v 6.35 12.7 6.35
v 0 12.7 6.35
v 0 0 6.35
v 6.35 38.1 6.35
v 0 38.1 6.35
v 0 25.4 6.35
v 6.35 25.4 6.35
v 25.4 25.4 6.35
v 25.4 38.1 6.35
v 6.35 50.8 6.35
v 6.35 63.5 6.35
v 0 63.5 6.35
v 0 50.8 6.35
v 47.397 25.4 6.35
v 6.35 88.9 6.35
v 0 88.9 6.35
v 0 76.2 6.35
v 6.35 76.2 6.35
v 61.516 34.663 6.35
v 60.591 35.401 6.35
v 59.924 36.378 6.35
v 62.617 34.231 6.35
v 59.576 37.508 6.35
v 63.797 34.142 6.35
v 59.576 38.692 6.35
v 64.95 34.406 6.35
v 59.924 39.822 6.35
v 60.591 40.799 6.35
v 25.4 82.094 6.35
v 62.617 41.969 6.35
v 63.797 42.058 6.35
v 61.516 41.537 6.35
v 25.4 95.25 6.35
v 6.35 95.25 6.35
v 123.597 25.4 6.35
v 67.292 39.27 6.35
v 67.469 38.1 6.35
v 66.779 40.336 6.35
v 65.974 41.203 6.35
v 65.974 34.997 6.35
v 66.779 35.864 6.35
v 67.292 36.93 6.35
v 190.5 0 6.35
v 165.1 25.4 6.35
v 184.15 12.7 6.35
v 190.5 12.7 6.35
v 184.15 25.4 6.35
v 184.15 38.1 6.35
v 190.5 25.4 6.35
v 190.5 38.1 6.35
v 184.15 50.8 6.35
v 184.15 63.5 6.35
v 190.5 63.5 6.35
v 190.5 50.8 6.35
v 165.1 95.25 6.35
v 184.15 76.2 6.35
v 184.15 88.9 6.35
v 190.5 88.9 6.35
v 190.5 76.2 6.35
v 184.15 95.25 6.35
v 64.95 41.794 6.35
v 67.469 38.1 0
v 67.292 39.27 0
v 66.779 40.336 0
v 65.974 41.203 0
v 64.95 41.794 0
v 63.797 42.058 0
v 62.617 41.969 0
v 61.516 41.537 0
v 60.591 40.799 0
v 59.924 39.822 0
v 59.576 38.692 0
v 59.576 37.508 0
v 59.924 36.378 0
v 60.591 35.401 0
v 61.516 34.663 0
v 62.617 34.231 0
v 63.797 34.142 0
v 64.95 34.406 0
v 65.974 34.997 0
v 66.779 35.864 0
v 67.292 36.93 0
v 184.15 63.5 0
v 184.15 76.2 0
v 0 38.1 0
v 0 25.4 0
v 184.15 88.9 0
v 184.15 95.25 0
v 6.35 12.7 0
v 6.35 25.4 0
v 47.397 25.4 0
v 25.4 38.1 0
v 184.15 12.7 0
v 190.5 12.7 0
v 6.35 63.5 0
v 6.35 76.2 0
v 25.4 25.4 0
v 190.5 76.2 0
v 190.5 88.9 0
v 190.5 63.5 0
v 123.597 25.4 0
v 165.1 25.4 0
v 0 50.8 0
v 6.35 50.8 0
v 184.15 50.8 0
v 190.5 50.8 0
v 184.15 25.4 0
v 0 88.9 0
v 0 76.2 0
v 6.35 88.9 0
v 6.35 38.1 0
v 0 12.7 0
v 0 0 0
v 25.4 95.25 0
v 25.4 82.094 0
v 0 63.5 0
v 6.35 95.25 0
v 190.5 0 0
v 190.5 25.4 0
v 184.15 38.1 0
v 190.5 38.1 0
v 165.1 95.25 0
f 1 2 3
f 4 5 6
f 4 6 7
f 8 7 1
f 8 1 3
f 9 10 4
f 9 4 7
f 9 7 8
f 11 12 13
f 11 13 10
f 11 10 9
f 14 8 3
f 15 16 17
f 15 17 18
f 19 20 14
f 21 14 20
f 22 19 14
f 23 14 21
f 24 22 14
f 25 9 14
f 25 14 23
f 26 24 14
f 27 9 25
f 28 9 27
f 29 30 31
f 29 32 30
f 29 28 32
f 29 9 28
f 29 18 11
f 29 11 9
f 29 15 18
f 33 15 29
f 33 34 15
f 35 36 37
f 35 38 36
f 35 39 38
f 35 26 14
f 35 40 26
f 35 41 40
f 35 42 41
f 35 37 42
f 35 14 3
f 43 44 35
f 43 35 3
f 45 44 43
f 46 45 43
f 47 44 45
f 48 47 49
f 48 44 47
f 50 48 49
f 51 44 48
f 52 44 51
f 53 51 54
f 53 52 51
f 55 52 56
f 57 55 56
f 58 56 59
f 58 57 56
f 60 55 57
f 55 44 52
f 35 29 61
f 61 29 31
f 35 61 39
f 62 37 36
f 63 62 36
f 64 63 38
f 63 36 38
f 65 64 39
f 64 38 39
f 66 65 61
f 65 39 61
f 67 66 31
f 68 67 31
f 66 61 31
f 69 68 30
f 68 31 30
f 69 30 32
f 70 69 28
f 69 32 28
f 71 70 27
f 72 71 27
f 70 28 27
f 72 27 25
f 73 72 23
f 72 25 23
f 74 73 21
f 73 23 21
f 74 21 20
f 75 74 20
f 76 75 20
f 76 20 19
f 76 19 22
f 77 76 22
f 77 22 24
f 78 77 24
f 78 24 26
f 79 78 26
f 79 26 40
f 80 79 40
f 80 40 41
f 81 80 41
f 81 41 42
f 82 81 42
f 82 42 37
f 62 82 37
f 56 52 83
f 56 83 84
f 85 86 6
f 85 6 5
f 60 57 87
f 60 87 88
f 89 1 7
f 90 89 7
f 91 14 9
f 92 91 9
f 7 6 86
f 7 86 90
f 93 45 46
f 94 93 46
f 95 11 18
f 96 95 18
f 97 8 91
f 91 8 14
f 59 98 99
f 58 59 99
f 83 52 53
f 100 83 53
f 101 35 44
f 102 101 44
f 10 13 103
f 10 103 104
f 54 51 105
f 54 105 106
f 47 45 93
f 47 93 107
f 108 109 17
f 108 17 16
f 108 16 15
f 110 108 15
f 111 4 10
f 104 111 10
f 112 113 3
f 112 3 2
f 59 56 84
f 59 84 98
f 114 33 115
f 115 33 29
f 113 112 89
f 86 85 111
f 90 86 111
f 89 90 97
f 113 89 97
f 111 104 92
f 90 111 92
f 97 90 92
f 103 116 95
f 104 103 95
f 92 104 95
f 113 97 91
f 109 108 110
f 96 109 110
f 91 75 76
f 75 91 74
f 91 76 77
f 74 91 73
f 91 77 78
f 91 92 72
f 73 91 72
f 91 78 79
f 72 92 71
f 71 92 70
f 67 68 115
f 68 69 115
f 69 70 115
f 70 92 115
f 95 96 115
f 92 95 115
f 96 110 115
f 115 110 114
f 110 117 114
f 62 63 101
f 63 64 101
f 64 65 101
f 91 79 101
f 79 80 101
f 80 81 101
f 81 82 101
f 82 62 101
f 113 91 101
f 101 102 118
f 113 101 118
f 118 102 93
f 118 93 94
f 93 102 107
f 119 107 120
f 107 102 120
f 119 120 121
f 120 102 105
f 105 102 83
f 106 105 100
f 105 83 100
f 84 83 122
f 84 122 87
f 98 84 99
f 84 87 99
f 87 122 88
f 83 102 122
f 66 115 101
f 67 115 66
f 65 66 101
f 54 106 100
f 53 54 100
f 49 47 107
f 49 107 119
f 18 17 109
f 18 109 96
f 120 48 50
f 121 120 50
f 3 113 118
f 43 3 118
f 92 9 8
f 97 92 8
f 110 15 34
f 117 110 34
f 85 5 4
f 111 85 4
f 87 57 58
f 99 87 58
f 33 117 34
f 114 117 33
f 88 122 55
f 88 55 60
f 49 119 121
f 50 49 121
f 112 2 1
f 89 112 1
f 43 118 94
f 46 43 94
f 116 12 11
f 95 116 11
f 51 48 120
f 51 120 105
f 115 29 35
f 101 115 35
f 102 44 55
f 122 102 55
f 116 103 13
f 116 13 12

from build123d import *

# Parameters (mm, degrees)
SKETCH1_W           = 190.5
SKETCH1_H           = 95.25
BOSS_EXTRUDE1_DEPTH = 6.35
SKETCH2_R           = 3.96875
CUT_EXTRUDE1_DEPTH  = 7.35
SKETCH3_W           = 6.35
SKETCH3_H           = 12.7
CUT_EXTRUDE2_DEPTH  = 7.35
SKETCH4_W           = 6.35
SKETCH4_H           = 12.7
CUT_EXTRUDE3_DEPTH  = 7.35
LPATTERN1_COUNT     = 4
LPATTERN1_PITCH     = 25.4
CUT_EXTRUDE4_DEPTH  = 7.35


with BuildPart() as part:
    # Sketch1 → Boss-Extrude1 (new body)
    with BuildSketch(Plane.XY):
        with Locations((95.25, 47.625)):
            Rectangle(SKETCH1_W, SKETCH1_H)
    extrude(amount=BOSS_EXTRUDE1_DEPTH)

    # Sketch2 → Cut-Extrude1 (cut, through all)
    with BuildSketch(Plane.XY.offset(6.35)):
        with Locations((63.5, 38.1)):
            Circle(SKETCH2_R)
    extrude(amount=-CUT_EXTRUDE1_DEPTH, mode=Mode.SUBTRACT)

    # Sketch3 → Cut-Extrude2 (cut, through all)
    with BuildSketch(Plane.XY.offset(6.35)):
        with Locations((3.175, 19.05)):
            Rectangle(SKETCH3_W, SKETCH3_H)
    cut_extrude2 = extrude(amount=-CUT_EXTRUDE2_DEPTH, mode=Mode.SUBTRACT)

    # Sketch4 → Cut-Extrude3 (cut, through all)
    with BuildSketch(Plane.XY.offset(6.35)):
        with Locations((187.325, 19.05)):
            Rectangle(SKETCH4_W, SKETCH4_H)
    cut_extrude3 = extrude(amount=-CUT_EXTRUDE3_DEPTH, mode=Mode.SUBTRACT)

    # LPattern1: Cut-Extrude2, Cut-Extrude3 ×4
    with Locations(*[(0, i * LPATTERN1_PITCH, 0) for i in range(1, LPATTERN1_COUNT)]):
        add(cut_extrude2, mode=Mode.SUBTRACT)
        add(cut_extrude3, mode=Mode.SUBTRACT)

    # Sketch6 → Cut-Extrude4 (cut, through all)
    with BuildSketch(Plane.XY.offset(6.35)):
        Polygon((25.4, 95.25), (25.4, 82.094090512), (123.597045256, 25.4), (165.1, 25.4), (165.1, 95.25), align=None)
        Polygon((25.4, 38.1), (25.4, 25.4), (47.397045256, 25.4), align=None)
    extrude(amount=-CUT_EXTRUDE4_DEPTH, mode=Mode.SUBTRACT)


solid = part.part
